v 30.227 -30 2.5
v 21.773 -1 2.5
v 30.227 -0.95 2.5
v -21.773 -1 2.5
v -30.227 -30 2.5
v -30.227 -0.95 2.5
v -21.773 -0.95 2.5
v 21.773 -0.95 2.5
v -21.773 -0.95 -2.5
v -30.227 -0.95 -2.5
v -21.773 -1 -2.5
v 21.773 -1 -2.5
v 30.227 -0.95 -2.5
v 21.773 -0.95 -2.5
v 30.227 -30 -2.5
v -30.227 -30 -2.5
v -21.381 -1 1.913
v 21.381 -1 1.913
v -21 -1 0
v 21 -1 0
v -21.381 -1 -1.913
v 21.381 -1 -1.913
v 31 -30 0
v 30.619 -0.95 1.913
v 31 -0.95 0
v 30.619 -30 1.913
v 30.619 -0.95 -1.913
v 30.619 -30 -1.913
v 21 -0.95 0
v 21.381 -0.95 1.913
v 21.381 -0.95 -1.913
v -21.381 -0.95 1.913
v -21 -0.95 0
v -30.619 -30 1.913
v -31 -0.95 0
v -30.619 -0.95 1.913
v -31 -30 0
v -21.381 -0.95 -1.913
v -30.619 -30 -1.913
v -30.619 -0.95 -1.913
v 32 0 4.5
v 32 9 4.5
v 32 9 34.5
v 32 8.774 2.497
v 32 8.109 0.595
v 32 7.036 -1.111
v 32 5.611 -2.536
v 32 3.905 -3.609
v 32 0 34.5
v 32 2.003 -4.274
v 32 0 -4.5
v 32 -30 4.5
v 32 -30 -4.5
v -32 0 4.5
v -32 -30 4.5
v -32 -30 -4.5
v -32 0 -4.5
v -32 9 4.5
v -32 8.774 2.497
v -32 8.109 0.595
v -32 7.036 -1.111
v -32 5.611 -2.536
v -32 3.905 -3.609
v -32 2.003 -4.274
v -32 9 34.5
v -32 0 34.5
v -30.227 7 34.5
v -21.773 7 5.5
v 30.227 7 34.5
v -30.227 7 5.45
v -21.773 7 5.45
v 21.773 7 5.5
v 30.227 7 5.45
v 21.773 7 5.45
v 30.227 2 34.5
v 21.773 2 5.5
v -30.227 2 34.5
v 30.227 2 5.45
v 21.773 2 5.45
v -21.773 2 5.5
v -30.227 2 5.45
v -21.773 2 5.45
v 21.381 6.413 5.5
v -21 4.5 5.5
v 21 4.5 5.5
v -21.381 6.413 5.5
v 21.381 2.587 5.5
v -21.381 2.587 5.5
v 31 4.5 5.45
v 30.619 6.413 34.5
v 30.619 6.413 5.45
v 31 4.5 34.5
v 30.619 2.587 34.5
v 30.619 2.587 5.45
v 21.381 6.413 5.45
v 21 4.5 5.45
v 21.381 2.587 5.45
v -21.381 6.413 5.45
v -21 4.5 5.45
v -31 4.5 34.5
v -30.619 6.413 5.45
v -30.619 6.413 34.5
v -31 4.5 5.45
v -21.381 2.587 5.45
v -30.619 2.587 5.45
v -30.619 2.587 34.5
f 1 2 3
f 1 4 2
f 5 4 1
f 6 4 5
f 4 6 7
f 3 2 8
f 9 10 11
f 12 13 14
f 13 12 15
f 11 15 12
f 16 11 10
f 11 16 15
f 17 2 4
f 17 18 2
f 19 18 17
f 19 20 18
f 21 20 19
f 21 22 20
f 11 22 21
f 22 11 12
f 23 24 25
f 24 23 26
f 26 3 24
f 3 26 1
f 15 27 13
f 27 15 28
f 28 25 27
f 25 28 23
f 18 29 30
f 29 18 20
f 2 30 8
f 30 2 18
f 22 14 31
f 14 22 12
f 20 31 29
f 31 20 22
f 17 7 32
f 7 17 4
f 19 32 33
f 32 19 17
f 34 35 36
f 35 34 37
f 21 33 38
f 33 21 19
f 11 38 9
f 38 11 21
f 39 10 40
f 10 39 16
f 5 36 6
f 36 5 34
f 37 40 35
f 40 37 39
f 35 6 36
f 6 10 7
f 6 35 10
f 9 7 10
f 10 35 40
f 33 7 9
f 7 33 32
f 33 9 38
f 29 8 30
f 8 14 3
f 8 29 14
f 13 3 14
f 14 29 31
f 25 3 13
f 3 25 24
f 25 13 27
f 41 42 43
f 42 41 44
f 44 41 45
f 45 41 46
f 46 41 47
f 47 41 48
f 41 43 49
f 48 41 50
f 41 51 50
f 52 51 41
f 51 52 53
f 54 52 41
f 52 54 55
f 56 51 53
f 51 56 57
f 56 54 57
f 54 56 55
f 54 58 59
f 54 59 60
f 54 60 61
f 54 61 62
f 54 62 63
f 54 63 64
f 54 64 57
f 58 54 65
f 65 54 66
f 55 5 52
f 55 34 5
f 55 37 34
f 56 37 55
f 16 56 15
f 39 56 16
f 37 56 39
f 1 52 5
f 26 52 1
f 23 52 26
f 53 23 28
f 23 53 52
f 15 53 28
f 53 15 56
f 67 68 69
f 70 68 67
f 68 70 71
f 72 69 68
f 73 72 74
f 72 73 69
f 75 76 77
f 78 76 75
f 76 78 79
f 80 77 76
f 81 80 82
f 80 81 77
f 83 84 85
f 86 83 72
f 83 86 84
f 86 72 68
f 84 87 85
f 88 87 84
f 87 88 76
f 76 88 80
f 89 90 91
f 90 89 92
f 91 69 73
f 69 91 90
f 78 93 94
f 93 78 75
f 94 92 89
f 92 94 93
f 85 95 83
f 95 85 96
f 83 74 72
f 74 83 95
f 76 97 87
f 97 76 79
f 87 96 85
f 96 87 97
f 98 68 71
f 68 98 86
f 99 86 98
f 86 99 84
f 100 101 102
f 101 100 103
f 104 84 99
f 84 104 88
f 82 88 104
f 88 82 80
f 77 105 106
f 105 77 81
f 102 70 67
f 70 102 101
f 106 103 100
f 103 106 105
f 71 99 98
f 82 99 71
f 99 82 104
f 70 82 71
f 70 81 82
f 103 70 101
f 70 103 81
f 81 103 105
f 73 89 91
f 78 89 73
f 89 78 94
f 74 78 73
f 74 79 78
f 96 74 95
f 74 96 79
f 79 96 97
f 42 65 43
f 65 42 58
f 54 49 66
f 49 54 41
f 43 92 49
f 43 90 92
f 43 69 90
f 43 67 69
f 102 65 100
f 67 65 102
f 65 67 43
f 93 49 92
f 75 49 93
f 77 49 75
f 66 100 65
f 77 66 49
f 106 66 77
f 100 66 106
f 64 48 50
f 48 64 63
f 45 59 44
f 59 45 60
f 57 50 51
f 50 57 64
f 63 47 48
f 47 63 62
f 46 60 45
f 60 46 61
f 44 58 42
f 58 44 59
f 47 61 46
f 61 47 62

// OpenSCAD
use <lib/shortcuts.scad>


knick(60, 5, 30, 2, 90);

module knick(b=60, d=5, l=20, w=1.5, ang=10)
{

module rohr() {
	D() {
		Cu(b+2*w, l, d+2*w);
		intersection() {
		union() {
		Ty(-w/2)Cu(b, l, d);
		Rx(90)Tx(l-d+w/2)Cy(r=d, h=l+0.1);
		Rx(90)Tx(-(l-d+w/2))Cy(r=d, h=l+0.1);
		}
		Ty(-w/2)Cu(b+w*2, l+0.1, d);
		}
	
	
	}
}

Ty(-l/2) rohr();

Tz((d+2*w)/2) Ry(90)
	rotate_extrude(angle=ang) Tx((d+2*w)/2) Sq(d+w*2, b+2*w);

Tz((d+2*w)/2) Rx(ang)
	Tz(-(d+2*w)/2)Ty(l/2) Rx(180) rohr();

}
